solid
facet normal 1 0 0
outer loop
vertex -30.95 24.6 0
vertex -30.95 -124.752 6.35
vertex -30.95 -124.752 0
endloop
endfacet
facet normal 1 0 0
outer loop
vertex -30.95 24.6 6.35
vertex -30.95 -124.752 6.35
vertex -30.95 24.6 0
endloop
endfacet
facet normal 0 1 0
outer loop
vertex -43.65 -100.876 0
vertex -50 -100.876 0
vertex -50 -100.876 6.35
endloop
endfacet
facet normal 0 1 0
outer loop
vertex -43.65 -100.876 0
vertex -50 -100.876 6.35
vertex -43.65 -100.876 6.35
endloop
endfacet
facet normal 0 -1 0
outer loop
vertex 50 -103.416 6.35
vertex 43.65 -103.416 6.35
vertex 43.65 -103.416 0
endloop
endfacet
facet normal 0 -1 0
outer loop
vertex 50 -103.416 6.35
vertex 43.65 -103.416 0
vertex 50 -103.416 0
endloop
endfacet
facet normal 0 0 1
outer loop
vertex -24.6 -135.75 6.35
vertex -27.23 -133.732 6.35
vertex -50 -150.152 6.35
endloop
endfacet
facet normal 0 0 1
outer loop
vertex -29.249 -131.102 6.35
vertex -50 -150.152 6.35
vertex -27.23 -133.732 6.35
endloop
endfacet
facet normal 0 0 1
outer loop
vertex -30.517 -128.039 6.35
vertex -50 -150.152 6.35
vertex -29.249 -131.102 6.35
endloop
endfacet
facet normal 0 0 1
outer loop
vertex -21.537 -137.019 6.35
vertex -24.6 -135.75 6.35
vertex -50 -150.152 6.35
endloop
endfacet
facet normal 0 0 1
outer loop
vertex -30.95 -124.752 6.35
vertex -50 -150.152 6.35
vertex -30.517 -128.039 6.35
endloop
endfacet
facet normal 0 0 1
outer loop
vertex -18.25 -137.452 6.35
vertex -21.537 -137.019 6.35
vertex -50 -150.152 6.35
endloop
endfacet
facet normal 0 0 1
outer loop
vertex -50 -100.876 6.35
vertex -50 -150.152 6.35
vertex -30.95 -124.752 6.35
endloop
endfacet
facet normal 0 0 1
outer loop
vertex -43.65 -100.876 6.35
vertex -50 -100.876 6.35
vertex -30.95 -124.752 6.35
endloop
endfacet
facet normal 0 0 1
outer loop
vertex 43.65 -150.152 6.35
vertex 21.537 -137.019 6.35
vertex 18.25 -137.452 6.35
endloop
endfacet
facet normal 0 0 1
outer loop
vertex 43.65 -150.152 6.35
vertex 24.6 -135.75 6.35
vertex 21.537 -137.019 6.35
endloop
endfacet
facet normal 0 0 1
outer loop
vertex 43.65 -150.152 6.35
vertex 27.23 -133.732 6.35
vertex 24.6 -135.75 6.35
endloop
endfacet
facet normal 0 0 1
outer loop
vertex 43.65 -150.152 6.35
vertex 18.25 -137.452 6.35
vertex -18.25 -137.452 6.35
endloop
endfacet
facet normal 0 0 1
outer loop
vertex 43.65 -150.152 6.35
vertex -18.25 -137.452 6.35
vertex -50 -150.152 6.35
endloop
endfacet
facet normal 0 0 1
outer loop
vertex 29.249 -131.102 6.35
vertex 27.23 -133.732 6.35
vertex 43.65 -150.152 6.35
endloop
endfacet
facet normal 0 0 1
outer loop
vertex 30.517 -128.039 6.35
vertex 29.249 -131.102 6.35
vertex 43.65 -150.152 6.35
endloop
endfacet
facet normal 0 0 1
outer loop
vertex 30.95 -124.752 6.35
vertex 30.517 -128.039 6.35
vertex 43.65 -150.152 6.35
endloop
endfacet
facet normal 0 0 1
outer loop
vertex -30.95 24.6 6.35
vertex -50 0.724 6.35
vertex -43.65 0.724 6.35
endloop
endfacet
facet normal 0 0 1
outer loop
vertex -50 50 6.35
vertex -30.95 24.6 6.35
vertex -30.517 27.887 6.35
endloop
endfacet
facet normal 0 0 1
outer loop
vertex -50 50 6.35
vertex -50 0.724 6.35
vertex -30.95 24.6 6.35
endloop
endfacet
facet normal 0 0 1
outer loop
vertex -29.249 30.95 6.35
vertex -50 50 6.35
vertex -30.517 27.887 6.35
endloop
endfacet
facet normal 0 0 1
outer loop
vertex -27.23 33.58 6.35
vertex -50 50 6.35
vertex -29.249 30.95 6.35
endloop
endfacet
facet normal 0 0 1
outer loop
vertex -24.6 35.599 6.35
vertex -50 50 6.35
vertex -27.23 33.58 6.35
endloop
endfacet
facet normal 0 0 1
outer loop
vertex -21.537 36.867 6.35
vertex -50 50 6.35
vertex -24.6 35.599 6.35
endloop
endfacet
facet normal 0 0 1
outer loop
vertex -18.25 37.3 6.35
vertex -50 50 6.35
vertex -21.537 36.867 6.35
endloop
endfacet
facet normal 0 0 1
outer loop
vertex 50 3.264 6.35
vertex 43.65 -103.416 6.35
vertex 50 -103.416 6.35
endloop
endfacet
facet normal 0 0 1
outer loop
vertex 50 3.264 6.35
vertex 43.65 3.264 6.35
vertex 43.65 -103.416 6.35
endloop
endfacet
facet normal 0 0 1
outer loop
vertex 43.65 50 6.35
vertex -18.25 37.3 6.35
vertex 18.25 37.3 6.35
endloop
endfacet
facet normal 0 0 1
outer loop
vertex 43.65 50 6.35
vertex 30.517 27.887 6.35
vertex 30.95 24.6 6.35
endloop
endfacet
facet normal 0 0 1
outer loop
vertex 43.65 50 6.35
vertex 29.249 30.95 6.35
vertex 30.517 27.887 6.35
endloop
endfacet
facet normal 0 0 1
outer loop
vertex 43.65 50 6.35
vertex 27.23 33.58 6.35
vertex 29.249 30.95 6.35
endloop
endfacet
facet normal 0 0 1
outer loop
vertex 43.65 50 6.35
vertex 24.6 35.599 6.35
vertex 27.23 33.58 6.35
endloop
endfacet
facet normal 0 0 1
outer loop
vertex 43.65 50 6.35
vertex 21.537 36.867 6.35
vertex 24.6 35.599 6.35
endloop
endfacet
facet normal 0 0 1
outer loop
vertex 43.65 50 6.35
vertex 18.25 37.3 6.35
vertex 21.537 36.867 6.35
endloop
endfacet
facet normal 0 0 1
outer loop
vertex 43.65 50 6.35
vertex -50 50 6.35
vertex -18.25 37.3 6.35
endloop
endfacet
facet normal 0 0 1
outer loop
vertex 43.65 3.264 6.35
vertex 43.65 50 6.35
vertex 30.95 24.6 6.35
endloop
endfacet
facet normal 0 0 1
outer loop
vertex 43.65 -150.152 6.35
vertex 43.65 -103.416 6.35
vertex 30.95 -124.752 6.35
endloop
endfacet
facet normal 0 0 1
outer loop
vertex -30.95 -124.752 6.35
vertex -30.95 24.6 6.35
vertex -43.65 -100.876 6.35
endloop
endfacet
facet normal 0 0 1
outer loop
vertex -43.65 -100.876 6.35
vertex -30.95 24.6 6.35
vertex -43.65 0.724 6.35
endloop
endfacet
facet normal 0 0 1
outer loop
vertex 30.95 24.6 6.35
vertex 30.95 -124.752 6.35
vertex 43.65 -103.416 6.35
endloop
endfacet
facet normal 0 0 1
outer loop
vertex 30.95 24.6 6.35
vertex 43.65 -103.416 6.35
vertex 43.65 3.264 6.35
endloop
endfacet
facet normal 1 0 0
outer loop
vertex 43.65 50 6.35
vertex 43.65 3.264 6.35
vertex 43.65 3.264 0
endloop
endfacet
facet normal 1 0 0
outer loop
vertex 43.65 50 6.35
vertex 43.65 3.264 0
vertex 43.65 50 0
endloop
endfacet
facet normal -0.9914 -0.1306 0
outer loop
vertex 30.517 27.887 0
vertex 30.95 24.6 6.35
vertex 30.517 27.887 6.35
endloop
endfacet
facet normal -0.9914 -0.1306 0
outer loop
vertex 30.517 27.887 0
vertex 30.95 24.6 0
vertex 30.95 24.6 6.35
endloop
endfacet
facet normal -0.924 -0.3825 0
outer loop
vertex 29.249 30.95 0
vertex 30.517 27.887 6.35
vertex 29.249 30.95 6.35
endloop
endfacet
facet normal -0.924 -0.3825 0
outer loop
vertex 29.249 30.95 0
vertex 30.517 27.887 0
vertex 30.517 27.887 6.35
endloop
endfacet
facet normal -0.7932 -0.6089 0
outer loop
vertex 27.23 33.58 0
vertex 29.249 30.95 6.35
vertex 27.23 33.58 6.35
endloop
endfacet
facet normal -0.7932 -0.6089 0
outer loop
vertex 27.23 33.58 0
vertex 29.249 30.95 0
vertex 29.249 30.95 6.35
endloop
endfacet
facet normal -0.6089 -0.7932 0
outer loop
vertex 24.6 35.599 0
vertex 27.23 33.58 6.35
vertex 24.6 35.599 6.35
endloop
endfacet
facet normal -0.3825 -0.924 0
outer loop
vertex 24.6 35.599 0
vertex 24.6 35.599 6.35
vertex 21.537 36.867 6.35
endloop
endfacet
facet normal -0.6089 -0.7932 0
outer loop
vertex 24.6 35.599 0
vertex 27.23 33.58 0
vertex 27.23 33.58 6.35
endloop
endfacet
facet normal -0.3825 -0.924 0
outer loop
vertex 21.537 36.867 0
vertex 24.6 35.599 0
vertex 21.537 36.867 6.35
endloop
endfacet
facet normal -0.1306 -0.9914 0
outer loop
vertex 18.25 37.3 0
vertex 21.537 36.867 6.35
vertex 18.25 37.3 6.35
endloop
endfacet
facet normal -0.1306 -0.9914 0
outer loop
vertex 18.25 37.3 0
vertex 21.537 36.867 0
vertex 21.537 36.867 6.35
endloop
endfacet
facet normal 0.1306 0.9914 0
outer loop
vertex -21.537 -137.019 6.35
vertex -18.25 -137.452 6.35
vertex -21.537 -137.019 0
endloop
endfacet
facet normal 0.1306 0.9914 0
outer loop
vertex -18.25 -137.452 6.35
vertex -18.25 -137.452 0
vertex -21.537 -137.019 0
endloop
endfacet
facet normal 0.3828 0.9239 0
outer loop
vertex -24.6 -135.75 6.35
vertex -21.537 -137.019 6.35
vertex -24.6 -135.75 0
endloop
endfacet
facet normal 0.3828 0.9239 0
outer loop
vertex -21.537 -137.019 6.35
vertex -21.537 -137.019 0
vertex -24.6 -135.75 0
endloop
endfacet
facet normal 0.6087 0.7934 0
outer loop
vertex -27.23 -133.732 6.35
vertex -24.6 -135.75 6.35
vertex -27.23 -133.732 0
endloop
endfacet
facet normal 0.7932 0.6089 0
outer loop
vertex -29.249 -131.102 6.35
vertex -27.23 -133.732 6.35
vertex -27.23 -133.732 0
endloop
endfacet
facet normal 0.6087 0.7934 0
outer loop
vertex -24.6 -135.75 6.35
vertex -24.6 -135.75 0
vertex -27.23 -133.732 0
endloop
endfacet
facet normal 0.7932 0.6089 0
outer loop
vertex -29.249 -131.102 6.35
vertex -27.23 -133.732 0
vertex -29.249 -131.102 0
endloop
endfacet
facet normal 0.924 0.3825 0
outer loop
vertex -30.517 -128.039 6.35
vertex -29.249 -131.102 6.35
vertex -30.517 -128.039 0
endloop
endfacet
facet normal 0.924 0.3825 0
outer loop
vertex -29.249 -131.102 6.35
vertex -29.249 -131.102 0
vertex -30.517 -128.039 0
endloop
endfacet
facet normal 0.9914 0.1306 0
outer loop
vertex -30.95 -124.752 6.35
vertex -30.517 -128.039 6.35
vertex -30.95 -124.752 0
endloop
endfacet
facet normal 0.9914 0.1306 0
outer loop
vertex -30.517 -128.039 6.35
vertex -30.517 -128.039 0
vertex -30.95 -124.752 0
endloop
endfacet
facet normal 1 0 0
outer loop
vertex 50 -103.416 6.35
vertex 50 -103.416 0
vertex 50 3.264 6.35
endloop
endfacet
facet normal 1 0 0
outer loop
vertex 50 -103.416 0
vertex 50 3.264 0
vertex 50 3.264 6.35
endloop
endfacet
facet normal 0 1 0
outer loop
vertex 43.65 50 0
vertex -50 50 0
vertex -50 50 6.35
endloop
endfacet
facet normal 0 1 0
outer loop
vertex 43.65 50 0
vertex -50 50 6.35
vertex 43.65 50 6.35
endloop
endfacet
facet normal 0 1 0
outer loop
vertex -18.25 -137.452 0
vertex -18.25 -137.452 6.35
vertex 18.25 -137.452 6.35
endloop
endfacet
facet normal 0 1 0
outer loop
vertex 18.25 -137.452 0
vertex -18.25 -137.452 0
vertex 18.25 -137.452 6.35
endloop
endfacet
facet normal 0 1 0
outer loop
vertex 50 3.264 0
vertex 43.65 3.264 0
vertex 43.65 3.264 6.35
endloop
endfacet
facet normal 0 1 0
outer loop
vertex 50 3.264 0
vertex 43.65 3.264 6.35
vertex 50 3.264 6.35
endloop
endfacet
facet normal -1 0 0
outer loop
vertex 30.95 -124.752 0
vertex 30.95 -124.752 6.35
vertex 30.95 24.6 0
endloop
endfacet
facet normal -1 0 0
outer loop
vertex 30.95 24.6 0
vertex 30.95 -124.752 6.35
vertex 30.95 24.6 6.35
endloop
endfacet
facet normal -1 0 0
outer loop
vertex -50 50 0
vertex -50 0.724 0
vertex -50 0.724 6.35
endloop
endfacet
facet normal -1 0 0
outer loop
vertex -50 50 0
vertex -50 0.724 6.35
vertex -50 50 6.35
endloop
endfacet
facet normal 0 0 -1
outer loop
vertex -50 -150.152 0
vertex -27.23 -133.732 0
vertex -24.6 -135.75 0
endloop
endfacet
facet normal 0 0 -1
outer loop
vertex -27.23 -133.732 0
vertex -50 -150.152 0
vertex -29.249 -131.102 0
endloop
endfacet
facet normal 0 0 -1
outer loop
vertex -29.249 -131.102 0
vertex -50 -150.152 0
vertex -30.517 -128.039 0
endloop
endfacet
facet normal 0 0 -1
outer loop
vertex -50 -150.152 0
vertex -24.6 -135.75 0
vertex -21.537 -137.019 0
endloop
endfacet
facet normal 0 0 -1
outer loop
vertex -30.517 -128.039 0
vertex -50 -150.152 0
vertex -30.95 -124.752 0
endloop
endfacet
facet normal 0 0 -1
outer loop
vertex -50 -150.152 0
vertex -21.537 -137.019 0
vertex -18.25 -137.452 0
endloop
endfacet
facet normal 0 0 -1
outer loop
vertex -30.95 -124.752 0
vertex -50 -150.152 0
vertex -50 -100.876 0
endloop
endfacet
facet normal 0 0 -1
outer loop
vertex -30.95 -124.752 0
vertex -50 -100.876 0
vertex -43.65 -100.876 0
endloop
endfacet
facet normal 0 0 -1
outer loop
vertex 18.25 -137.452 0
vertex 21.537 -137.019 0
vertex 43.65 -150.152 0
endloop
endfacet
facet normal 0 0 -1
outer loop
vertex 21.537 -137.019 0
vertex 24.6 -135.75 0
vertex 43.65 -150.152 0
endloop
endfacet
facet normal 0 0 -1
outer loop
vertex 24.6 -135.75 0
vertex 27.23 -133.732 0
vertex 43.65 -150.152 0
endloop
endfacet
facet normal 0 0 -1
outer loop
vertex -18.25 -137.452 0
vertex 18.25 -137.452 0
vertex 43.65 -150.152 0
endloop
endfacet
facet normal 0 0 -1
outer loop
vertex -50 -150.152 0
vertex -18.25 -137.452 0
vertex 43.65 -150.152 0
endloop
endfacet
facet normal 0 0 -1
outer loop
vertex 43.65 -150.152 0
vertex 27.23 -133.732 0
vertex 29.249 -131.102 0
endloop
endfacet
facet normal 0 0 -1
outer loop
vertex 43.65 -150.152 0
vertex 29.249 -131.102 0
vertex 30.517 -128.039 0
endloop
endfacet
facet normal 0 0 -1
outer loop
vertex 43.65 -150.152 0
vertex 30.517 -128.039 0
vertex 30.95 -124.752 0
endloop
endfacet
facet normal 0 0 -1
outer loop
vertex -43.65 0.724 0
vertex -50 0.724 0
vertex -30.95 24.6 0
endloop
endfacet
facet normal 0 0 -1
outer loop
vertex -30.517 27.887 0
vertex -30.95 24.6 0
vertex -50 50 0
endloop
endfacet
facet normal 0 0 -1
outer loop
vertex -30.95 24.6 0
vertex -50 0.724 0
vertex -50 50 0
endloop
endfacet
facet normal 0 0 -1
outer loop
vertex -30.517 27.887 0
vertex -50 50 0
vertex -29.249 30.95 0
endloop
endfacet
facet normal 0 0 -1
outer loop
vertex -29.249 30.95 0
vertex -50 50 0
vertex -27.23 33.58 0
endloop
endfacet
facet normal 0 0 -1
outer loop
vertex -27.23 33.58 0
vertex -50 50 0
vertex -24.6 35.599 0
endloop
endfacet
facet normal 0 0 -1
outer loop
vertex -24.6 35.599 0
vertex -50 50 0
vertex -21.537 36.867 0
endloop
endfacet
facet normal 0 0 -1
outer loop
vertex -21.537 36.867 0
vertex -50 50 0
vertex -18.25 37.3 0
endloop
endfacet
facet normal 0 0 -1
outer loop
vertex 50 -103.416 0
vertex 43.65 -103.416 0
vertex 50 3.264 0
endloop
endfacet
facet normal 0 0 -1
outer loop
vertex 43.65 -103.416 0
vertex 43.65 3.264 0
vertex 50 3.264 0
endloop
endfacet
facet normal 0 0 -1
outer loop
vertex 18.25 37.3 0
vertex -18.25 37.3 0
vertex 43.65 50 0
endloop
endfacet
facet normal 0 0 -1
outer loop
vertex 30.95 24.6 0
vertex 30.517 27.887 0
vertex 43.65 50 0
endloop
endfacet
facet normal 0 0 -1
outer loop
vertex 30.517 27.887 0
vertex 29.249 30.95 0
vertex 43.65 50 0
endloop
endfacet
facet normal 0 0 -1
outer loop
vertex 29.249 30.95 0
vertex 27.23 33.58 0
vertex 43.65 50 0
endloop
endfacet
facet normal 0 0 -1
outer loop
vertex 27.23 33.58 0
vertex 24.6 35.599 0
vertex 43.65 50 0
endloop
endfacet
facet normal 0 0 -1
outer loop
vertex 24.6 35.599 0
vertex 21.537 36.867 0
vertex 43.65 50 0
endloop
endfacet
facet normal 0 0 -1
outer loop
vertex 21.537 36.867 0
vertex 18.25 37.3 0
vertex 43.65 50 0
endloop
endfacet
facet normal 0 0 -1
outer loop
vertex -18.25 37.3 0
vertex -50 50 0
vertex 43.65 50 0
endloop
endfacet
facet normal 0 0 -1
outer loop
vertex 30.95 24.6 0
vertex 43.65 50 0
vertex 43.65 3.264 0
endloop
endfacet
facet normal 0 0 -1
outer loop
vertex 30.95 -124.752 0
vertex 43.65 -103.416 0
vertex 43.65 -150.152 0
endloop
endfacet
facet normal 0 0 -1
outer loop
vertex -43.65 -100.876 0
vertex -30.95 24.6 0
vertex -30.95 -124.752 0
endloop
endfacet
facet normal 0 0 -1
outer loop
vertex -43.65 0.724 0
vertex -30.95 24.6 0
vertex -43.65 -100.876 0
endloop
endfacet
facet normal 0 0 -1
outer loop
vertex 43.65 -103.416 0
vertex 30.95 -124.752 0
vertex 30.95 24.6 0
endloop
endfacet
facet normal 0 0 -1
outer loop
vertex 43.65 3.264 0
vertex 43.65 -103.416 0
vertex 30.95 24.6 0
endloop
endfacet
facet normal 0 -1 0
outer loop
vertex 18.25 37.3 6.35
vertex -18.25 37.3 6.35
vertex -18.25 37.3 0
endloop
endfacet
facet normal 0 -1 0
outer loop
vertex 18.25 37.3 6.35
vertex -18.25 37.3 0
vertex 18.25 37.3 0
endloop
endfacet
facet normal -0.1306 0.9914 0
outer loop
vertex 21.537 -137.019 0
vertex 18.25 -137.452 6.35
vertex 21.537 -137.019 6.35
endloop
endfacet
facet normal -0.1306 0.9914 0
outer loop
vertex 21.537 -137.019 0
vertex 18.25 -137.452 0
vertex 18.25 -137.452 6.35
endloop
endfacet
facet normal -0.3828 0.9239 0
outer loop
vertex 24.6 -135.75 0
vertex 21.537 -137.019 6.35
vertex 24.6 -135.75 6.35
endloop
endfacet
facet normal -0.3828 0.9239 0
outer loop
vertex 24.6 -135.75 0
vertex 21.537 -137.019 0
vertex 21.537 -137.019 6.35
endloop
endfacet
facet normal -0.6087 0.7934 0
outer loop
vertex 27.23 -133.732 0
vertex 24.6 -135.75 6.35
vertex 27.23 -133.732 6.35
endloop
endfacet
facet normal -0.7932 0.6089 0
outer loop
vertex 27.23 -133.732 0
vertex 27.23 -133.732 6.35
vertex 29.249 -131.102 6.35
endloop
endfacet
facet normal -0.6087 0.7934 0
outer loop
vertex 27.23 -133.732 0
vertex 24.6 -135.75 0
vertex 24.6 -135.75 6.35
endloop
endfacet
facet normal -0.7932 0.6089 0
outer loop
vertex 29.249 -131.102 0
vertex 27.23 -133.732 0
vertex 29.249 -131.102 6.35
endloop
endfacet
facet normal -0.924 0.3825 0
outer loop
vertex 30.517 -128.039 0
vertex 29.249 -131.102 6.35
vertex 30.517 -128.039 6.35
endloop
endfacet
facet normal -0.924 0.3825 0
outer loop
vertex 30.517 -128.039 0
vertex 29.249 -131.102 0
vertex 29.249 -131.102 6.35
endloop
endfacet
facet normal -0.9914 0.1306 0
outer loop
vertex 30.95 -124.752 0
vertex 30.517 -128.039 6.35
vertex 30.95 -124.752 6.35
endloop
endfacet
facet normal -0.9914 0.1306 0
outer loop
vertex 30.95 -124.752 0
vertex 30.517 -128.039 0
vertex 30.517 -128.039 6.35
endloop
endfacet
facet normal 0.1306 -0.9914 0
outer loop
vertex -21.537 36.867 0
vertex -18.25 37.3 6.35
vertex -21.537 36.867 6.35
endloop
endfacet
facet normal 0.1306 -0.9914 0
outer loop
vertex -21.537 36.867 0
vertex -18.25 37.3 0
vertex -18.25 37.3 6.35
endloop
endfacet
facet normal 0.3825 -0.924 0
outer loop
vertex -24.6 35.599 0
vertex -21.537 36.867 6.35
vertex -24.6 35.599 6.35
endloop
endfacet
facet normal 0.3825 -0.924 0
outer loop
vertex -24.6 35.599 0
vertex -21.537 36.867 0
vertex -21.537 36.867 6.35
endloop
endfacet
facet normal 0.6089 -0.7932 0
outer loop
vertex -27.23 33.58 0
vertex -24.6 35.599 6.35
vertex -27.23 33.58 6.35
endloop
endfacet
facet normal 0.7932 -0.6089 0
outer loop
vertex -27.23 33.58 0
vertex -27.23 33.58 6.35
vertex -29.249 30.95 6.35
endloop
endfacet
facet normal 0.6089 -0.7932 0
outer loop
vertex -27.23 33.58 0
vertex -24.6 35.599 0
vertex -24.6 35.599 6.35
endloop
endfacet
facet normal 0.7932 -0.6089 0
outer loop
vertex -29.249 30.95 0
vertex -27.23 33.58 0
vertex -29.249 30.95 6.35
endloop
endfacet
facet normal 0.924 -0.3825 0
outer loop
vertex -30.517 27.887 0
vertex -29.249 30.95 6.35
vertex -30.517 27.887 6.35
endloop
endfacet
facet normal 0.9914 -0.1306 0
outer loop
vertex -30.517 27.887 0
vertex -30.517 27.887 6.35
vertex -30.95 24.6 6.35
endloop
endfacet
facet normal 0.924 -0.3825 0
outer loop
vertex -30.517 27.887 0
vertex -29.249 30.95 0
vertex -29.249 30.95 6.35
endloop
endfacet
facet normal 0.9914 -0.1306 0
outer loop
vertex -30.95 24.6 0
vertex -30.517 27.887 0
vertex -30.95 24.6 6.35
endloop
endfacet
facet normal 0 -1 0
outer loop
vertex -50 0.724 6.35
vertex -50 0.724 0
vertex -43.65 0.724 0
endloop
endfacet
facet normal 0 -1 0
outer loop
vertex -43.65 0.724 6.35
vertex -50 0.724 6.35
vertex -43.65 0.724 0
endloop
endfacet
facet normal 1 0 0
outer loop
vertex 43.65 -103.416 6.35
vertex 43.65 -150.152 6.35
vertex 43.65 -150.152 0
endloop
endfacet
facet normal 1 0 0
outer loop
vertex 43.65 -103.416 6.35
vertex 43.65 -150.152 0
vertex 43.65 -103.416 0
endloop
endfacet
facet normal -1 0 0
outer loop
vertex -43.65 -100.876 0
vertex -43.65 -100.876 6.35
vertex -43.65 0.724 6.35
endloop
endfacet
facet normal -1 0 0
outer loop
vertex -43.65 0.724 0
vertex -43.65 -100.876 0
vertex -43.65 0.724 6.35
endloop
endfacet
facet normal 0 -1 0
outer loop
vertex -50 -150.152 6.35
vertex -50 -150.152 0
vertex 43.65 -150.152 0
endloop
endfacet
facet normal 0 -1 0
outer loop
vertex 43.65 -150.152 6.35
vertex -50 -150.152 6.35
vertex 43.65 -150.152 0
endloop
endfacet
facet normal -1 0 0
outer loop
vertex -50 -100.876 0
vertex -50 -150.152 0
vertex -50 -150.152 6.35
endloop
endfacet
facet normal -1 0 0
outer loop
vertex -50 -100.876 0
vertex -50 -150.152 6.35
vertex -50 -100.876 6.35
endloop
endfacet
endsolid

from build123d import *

# Parameters (mm, degrees)
SKETCH1_W           = 100
SKETCH1_H           = 200.1518
BOSS_EXTRUDE1_DEPTH = 6.35
SKETCH2_W           = 6.35
SKETCH2_H           = 50.8
SKETCH2_H_2         = 49.2759
CUT_EXTRUDE1_DEPTH  = 6.35
SKETCH3_W           = 61.9
SKETCH3_H           = 174.7518
CUT_EXTRUDE2_DEPTH  = 6.35
FILLET1_R           = 12.7
SKETCH6_W           = 6.35
SKETCH6_H           = 6.35
BOSS_EXTRUDE2_DEPTH = 2.54
SKETCH7_W           = 6.35
SKETCH7_H           = 6.35
BOSS_EXTRUDE3_DEPTH = 2.54


with BuildPart() as part:
    # Sketch1 → Boss-Extrude1 (new body)
    with BuildSketch(Plane.XY):
        with Locations((0, -50.0759)):
            Rectangle(SKETCH1_W, SKETCH1_H)
    extrude(amount=BOSS_EXTRUDE1_DEPTH)

    # Sketch2 → Cut-Extrude1 (cut)
    with BuildSketch(Plane.XY.offset(6.35)):
        with Locations((-46.825, -24.6759)):
            Rectangle(SKETCH2_W, SKETCH2_H)
        with Locations((-46.825, -75.4759)):
            Rectangle(SKETCH2_W, SKETCH2_H)
        with Locations((46.825, 25.36205)):
            Rectangle(SKETCH2_W, SKETCH2_H_2)
        with Locations((46.825, -125.51385)):
            Rectangle(SKETCH2_W, SKETCH2_H_2)
    extrude(amount=-CUT_EXTRUDE1_DEPTH, mode=Mode.SUBTRACT)

    # Sketch3 → Cut-Extrude2 (cut)
    with BuildSketch(Plane.XY.offset(6.35)):
        with Locations((0, -50.0759)):
            Rectangle(SKETCH3_W, SKETCH3_H)
    extrude(amount=-CUT_EXTRUDE2_DEPTH, mode=Mode.SUBTRACT)

    # Fillet1
    fillet1_edges = [part.edges().sort_by_distance(p)[0] for p in [
        (-30.95, -137.4518, 3.175),
        (-30.95, 37.3, 3.175),
        (30.95, 37.3, 3.175),
        (30.95, -137.4518, 3.175),
    ]]
    fillet(fillet1_edges, radius=FILLET1_R)

    # Sketch6 → Boss-Extrude2 (add)
    with BuildSketch(Plane(origin=(0, 0.7241, 0), x_dir=(1, 0, 0), z_dir=(0, 1, 0))):
        with Locations((46.825, -3.175)):
            Rectangle(SKETCH6_W, SKETCH6_H)
    extrude(amount=BOSS_EXTRUDE2_DEPTH)

    # Sketch7 → Boss-Extrude3 (add)
    with BuildSketch(Plane.XZ.offset(100.8759)):
        with Locations((46.825, 3.175)):
            Rectangle(SKETCH7_W, SKETCH7_H)
    extrude(amount=BOSS_EXTRUDE3_DEPTH)


solid = part.part
